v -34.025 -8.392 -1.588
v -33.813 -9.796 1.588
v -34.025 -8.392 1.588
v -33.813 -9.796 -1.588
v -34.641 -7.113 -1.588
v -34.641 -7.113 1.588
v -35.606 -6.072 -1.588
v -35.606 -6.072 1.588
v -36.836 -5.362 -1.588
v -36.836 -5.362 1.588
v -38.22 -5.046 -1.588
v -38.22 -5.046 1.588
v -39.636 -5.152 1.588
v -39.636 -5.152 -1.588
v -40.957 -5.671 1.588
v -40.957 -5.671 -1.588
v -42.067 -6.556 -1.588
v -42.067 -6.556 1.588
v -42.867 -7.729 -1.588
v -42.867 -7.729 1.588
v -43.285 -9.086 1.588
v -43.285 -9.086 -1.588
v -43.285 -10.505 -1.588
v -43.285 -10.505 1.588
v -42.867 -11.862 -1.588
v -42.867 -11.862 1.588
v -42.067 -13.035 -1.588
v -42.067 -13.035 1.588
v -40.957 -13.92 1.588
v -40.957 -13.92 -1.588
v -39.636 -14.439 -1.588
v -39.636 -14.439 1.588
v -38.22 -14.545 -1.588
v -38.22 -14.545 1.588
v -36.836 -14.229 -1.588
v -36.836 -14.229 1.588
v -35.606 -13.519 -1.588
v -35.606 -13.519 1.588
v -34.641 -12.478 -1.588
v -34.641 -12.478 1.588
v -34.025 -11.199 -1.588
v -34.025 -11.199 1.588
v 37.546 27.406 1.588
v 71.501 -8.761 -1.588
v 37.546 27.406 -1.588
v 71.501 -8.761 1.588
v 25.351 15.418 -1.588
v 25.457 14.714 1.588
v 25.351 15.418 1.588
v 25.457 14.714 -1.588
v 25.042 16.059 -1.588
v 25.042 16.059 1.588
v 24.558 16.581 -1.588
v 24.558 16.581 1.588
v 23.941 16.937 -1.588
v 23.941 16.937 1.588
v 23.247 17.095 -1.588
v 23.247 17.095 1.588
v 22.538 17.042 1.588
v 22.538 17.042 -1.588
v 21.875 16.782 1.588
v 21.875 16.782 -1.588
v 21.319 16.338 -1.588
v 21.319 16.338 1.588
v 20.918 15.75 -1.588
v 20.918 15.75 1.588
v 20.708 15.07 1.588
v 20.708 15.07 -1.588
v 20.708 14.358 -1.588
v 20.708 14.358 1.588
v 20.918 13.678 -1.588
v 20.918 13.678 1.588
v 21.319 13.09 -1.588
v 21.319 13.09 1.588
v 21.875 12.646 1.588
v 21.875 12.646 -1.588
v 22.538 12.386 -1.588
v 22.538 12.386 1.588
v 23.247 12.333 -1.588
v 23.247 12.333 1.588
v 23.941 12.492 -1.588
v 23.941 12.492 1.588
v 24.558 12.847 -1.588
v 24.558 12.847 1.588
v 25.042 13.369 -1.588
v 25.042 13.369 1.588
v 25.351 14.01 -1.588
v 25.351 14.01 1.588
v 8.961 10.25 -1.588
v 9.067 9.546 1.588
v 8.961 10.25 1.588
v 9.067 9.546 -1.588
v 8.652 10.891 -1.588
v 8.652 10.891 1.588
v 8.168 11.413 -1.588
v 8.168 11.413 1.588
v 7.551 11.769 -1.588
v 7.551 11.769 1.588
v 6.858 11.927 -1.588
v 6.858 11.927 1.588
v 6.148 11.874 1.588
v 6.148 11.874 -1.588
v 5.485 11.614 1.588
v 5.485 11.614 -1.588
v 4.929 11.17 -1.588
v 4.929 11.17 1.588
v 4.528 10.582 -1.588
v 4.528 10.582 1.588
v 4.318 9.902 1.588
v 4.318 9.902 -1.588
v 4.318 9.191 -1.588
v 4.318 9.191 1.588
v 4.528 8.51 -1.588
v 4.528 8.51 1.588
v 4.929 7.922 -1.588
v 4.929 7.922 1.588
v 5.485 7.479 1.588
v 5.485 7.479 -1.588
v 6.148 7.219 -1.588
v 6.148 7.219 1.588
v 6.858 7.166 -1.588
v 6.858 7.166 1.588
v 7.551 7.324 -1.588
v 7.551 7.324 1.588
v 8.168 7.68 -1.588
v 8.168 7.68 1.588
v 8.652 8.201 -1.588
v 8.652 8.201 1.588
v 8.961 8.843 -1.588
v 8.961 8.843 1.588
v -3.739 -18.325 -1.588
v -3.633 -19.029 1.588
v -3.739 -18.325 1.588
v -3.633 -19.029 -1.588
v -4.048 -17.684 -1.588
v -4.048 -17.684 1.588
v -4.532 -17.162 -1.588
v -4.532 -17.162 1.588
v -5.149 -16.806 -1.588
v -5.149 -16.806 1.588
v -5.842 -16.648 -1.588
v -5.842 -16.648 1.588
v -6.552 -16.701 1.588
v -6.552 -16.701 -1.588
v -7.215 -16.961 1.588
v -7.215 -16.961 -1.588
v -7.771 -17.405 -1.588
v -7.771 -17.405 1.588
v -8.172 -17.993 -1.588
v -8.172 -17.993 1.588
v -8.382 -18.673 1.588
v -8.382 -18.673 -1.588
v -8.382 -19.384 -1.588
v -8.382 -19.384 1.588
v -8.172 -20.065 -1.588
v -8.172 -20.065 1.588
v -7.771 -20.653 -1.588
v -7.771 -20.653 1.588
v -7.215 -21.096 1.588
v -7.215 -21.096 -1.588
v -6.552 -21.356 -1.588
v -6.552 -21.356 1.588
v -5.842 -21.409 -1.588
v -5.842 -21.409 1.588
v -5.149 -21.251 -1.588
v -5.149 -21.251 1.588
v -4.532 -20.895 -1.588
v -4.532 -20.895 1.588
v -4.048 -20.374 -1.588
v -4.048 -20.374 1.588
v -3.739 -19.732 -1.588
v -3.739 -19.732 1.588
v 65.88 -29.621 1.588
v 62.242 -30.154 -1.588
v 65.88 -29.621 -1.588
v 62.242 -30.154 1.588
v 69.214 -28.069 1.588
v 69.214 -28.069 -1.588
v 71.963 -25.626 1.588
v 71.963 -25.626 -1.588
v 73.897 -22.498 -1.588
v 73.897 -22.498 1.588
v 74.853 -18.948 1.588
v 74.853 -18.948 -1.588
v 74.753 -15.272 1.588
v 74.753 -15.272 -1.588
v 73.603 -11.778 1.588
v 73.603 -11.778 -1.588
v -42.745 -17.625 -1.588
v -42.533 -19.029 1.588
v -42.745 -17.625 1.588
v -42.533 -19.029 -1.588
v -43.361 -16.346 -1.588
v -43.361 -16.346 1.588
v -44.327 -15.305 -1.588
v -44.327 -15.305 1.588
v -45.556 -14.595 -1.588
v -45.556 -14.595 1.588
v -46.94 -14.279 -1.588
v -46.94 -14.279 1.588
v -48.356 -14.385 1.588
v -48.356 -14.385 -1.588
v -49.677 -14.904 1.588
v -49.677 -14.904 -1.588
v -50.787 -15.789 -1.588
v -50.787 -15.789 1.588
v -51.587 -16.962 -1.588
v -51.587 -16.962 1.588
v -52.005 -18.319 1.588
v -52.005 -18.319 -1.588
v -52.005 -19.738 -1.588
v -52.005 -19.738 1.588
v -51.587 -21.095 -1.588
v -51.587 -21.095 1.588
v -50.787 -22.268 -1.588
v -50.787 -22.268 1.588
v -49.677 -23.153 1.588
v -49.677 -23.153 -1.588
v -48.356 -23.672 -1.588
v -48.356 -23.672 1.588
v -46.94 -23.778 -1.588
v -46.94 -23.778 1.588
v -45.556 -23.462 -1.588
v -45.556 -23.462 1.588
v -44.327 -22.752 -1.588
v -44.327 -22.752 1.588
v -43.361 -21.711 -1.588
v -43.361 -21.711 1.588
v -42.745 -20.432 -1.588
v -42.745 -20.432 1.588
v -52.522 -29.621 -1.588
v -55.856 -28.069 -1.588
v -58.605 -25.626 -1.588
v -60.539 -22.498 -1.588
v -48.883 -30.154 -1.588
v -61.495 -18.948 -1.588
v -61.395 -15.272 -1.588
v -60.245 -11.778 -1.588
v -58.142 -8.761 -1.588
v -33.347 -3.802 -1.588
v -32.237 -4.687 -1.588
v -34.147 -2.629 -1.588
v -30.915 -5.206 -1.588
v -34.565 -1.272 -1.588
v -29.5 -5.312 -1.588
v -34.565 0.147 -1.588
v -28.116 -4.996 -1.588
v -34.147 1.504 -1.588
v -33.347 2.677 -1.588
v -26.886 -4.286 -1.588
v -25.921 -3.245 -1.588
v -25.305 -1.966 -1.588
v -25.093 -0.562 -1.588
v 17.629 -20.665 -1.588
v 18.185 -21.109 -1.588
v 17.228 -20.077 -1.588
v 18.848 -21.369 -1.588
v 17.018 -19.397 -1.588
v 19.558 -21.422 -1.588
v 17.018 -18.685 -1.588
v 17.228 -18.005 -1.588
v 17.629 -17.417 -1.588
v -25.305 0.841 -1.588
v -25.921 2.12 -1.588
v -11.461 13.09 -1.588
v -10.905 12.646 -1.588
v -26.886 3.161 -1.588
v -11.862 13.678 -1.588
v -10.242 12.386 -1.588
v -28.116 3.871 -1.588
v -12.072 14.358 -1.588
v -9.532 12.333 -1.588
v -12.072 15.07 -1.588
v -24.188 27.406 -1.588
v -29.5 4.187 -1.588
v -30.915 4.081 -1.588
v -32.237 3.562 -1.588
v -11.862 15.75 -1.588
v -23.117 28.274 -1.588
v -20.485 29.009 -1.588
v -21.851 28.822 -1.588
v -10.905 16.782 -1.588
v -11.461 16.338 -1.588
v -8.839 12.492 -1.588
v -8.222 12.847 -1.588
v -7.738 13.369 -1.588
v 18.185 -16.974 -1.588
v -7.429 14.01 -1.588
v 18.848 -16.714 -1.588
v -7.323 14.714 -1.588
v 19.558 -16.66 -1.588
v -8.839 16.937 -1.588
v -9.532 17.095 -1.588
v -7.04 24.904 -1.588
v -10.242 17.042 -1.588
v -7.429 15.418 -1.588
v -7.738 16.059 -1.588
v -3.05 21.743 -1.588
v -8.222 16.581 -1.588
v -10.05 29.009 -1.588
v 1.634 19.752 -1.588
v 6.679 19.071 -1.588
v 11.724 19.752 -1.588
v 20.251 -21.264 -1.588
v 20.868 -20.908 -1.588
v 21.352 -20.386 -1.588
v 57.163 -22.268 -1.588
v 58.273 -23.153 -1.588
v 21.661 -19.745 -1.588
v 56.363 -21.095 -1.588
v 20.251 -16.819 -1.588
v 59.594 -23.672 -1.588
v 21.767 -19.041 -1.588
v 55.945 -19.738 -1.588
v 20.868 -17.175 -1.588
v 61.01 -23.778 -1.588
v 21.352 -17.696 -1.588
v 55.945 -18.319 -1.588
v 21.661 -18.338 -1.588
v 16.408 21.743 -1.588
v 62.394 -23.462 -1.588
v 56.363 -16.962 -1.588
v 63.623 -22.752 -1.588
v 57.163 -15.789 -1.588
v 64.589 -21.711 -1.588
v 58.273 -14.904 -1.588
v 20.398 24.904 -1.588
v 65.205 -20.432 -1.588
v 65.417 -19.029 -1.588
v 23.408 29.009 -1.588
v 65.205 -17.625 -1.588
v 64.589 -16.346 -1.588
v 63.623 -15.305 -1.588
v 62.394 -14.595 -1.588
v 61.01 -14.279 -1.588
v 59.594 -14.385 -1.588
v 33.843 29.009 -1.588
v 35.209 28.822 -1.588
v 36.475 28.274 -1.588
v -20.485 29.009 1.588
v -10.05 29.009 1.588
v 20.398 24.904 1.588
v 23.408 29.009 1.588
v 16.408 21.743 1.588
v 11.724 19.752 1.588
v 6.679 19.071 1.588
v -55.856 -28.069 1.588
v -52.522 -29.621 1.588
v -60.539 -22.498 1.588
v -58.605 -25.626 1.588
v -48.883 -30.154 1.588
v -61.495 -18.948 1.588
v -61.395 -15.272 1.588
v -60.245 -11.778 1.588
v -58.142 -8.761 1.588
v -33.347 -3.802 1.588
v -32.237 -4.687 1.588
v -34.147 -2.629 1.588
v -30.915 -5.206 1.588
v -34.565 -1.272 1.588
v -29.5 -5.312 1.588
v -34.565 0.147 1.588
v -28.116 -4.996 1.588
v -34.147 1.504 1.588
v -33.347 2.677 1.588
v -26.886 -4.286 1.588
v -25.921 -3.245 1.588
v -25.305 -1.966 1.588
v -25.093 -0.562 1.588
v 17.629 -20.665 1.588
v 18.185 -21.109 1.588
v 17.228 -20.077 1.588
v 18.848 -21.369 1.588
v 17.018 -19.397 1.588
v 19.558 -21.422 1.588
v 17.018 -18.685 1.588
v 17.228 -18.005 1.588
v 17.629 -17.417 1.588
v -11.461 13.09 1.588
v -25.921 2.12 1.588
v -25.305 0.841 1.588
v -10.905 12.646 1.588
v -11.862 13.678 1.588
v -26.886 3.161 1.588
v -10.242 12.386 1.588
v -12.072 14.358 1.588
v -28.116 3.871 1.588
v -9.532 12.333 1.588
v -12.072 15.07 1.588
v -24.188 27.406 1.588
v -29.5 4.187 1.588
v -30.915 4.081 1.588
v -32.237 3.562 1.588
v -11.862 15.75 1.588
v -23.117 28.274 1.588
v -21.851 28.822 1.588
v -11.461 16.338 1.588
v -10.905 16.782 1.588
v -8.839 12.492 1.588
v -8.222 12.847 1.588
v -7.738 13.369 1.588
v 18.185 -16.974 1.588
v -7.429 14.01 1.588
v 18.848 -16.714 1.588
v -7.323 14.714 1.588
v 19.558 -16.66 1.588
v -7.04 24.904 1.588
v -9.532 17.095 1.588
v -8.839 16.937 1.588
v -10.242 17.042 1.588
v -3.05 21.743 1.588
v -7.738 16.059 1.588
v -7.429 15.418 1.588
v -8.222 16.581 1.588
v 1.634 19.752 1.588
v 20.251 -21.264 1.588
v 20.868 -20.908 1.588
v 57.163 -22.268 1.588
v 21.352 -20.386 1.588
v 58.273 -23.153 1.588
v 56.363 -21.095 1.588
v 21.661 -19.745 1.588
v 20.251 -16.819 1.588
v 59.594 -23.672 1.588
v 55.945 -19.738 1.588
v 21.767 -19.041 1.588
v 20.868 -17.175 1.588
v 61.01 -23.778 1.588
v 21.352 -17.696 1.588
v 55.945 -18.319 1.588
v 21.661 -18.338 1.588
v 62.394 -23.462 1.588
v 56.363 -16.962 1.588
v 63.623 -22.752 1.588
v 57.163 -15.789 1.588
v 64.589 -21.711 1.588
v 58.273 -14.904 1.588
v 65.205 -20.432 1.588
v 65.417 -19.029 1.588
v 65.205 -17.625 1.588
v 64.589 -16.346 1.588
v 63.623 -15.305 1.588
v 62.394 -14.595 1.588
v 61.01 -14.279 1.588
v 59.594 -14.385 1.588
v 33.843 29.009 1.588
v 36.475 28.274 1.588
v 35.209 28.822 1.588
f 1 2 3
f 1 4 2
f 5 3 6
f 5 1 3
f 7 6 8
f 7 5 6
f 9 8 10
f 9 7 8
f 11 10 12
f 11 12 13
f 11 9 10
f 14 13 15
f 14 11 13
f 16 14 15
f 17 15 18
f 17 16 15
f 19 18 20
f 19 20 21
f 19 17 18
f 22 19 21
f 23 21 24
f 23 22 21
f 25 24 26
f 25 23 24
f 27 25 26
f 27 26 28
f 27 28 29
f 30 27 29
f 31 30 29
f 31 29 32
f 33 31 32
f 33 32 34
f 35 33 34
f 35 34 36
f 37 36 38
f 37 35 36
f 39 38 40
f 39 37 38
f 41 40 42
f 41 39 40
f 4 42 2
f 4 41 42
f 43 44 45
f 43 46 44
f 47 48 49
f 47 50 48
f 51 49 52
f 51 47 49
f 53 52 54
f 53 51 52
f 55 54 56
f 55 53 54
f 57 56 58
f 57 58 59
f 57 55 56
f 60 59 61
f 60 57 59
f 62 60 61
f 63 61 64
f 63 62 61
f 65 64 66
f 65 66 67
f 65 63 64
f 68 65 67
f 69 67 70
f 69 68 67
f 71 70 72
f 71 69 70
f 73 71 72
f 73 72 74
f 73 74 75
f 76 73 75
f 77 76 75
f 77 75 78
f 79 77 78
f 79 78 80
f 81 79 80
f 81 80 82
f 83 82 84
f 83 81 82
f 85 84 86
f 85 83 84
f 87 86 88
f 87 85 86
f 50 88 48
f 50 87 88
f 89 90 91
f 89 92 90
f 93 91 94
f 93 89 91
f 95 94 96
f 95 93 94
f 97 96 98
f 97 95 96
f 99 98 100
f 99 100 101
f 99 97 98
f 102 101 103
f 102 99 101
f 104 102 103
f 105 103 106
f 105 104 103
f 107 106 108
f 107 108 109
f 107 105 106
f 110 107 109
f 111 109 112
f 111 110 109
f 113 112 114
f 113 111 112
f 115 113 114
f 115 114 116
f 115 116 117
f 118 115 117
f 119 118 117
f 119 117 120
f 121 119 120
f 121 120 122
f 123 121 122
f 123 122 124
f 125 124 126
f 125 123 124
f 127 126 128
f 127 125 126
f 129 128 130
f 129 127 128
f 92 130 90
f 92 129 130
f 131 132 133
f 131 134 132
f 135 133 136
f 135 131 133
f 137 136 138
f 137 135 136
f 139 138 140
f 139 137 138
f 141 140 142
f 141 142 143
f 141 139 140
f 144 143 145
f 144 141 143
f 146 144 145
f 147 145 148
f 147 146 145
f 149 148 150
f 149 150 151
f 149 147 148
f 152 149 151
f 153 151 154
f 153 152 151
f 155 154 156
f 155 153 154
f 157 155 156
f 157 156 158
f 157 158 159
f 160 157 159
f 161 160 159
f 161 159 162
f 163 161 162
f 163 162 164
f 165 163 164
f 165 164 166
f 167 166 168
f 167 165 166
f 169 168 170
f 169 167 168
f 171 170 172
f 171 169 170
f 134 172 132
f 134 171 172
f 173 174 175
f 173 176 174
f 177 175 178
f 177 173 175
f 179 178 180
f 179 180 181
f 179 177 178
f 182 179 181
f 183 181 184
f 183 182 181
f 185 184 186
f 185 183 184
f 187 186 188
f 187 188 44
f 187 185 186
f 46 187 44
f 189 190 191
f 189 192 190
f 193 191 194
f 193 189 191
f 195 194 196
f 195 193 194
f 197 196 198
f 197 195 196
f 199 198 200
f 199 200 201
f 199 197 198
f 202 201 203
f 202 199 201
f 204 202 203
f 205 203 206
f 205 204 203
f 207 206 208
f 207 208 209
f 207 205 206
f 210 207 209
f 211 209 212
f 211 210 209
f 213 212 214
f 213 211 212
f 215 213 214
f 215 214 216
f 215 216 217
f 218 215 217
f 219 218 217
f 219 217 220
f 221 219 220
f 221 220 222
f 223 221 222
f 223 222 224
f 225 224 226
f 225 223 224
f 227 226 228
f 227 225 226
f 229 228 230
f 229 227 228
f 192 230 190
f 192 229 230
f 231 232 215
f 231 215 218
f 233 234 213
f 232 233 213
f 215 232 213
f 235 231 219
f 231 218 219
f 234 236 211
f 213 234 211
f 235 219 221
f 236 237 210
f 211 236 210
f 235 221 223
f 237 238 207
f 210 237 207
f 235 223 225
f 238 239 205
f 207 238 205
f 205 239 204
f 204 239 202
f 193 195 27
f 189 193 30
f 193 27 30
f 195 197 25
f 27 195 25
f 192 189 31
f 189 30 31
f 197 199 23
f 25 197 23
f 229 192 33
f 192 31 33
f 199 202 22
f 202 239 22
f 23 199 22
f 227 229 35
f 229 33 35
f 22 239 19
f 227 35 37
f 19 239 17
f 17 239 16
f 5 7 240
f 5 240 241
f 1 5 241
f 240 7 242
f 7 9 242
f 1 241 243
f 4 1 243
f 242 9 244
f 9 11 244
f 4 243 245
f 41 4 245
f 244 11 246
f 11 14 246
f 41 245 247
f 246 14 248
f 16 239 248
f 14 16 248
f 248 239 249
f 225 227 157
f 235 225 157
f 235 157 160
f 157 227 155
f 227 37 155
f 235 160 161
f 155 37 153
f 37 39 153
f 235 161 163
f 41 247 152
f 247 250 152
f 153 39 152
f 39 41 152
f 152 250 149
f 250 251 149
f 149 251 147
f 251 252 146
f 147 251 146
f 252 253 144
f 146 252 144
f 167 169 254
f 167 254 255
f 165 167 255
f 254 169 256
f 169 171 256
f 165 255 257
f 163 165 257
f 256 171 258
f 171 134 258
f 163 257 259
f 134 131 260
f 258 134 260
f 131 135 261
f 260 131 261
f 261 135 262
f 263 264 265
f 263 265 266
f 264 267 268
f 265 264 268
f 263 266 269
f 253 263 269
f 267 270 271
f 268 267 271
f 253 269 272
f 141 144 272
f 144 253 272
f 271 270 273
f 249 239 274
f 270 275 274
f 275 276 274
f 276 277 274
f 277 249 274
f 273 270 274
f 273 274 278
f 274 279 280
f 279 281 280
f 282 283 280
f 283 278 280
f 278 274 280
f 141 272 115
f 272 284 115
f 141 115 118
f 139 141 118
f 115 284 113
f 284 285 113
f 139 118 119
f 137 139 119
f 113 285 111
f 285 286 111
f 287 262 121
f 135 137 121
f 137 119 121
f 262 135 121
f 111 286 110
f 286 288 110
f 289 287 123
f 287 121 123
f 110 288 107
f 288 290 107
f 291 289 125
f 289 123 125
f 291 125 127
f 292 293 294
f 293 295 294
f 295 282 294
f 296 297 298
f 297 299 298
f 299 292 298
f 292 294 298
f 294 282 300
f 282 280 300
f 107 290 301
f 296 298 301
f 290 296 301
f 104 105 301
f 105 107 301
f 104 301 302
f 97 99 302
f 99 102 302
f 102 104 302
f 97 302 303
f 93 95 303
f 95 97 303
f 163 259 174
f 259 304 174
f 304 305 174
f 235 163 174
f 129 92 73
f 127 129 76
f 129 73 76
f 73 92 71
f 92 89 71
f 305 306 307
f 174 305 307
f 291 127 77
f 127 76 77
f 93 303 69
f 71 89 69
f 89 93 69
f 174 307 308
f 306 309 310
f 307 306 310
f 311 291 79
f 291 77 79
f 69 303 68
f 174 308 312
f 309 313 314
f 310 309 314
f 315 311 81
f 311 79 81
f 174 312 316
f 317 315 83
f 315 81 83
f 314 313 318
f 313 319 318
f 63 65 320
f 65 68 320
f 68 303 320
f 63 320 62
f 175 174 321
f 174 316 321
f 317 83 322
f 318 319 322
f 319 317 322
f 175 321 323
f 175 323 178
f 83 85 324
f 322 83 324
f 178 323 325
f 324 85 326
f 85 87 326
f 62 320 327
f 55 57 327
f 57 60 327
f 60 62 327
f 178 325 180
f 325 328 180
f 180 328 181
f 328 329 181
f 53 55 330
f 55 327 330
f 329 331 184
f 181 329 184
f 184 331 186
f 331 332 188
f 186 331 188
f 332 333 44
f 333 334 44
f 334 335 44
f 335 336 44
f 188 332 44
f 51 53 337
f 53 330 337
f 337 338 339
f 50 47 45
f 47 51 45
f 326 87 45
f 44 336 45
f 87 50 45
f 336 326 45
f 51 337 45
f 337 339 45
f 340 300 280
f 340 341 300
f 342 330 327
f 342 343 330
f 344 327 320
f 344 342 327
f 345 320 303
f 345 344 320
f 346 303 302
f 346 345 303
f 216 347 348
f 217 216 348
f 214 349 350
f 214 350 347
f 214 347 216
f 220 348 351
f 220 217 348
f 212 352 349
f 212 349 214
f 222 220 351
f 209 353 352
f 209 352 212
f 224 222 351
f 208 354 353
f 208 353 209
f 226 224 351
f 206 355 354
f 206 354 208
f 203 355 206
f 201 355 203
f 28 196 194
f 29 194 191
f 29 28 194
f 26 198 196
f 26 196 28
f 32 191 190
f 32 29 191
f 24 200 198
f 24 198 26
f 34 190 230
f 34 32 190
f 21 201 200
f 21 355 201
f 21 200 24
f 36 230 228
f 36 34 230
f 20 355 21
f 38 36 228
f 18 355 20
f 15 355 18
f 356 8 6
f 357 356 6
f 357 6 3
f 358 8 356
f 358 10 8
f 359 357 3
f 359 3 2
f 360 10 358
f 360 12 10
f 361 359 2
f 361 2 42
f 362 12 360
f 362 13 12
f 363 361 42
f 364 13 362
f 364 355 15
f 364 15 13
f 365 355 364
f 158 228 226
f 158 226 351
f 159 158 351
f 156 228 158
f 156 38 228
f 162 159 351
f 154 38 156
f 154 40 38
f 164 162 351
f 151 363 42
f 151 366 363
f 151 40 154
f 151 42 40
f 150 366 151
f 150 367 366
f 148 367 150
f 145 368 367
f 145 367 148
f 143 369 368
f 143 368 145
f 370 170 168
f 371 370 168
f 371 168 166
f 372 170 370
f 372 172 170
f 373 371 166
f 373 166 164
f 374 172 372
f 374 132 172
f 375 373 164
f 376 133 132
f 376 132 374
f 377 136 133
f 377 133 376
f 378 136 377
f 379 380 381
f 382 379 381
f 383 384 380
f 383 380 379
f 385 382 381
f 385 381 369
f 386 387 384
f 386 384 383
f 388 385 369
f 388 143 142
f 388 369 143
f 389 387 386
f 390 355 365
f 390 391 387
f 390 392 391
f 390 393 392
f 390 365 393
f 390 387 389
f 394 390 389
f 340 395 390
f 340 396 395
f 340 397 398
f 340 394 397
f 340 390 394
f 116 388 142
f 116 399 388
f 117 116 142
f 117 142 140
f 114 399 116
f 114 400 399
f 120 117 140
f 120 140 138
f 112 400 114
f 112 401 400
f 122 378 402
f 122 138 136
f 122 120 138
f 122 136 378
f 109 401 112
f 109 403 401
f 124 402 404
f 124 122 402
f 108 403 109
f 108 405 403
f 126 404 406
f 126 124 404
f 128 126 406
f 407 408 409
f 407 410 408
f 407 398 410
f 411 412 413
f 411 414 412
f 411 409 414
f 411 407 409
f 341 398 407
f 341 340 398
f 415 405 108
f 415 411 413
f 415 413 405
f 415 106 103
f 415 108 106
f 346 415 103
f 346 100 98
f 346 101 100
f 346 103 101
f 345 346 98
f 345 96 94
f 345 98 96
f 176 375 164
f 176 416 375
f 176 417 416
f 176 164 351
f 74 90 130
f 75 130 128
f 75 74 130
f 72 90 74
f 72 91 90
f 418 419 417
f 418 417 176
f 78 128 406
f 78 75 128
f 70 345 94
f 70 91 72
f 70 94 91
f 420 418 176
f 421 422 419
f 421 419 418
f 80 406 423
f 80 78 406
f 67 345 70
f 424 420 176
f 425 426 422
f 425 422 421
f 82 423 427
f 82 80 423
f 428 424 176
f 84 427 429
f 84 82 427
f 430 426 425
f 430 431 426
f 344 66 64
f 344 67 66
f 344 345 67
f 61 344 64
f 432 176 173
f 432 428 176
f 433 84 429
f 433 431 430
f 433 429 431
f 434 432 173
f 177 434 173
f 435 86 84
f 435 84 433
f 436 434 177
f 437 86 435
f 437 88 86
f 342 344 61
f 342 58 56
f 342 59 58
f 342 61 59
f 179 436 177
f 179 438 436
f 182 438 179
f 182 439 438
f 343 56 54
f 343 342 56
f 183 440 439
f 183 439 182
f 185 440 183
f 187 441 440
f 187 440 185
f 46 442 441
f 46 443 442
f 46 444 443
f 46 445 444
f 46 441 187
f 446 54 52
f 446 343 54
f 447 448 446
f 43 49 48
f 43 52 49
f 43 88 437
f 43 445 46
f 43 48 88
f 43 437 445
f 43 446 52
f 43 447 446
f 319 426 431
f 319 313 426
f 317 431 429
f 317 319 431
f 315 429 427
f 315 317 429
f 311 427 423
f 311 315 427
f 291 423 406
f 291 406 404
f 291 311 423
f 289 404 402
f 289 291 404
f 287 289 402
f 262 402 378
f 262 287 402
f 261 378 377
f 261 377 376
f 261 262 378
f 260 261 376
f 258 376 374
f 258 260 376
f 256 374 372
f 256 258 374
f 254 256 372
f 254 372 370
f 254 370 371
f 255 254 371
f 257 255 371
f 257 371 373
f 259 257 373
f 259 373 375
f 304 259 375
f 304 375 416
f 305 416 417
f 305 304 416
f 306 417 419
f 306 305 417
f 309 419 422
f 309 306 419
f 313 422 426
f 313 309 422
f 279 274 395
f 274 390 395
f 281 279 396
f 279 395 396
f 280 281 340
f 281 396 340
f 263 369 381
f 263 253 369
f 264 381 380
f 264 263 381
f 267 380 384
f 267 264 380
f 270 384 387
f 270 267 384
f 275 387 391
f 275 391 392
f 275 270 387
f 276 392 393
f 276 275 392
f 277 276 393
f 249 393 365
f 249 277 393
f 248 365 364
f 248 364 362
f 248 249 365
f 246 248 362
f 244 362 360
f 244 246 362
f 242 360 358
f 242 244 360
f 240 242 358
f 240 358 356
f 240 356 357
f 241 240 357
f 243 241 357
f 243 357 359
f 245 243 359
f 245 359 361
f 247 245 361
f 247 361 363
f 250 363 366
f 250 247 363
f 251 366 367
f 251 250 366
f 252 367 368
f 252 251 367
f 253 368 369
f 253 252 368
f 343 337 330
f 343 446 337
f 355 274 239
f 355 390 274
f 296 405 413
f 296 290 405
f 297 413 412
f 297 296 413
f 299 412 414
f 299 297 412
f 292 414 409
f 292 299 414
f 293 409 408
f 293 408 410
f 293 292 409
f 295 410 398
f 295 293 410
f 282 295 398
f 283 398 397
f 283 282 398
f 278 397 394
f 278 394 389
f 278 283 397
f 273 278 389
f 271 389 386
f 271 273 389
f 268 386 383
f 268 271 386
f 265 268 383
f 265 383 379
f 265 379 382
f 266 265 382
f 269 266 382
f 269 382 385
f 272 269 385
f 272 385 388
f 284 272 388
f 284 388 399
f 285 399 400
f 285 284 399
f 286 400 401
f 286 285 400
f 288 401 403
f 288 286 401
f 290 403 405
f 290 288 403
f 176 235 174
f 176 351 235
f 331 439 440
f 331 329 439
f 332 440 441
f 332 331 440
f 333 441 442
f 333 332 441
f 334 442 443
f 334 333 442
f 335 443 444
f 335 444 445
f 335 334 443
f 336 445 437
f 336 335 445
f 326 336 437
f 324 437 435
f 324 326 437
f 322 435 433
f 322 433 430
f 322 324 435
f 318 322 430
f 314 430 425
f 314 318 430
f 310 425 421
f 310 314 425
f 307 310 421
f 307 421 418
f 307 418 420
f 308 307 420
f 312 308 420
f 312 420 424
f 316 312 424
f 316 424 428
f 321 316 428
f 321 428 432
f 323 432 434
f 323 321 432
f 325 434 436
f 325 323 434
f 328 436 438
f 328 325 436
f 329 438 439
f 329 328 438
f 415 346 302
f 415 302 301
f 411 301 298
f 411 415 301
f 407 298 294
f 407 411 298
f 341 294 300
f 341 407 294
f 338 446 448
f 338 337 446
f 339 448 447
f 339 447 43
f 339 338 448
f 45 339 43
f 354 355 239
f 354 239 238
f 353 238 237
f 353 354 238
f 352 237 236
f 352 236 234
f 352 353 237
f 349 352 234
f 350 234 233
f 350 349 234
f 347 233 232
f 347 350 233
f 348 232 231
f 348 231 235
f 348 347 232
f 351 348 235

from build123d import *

# Parameters (mm, degrees)
F0_R     = 4.7625
F0_R_2   = 2.3876
F1_DEPTH = 1.5875
F2_R     = 5.08


with BuildPart() as f1:
    # F0 (on Top) → F1 (new body, symmetric)
    with BuildSketch(Plane.XY):
        with BuildLine():
            ThreePointArc((23.408243, 29.00893), (16.408146, 21.743158), (6.679082, 19.07143))
            ThreePointArc((6.679082, 19.07143), (-3.049982, 21.743158), (-10.05008, 29.00893))
            Line((-10.05008, 29.00893), (-22.683318, 29.00893))
            Line((-22.683318, 29.00893), (-58.14247, -8.761247))
            ThreePointArc((-58.14247, -8.761247), (-60.538568, -22.498319), (-48.883418, -30.15377))
            Line((-48.883418, -30.15377), (6.679082, -30.15377))
            Line((6.679082, -30.15377), (62.241582, -30.15377))
            ThreePointArc((62.241582, -30.15377), (73.896732, -22.498319), (71.500634, -8.761247))
            Line((71.500634, -8.761247), (36.041482, 29.00893))
            Line((36.041482, 29.00893), (23.408243, 29.00893))
        make_face()
        with Locations((-47.295918, -19.02857)):
            Circle(F0_R, mode=Mode.SUBTRACT)
        with Locations((-6.020918, -19.02857)):
            Circle(F0_R_2, mode=Mode.SUBTRACT)
        with Locations((-38.575799, -9.795503)):
            Circle(F0_R, mode=Mode.SUBTRACT)
        with Locations((19.379082, -19.04127)):
            Circle(F0_R_2, mode=Mode.SUBTRACT)
        with Locations((60.654082, -19.02857)):
            Circle(F0_R, mode=Mode.SUBTRACT)
        with Locations((-29.85568, -0.562436)):
            Circle(F0_R, mode=Mode.SUBTRACT)
        with Locations((-9.710865, 14.71416)):
            Circle(F0_R_2, mode=Mode.SUBTRACT)
        with Locations((6.679082, 9.54643)):
            Circle(F0_R_2, mode=Mode.SUBTRACT)
        with Locations((23.069028, 14.71416)):
            Circle(F0_R_2, mode=Mode.SUBTRACT)
    extrude(amount=F1_DEPTH, both=True)

    # F2
    f2_edges = [f1.edges().sort_by_distance(p)[0] for p in [
        (-22.683318, 29.00893, 0),
        (36.041482, 29.00893, 0),
    ]]
    fillet(f2_edges, radius=F2_R)


solid = f1.part
